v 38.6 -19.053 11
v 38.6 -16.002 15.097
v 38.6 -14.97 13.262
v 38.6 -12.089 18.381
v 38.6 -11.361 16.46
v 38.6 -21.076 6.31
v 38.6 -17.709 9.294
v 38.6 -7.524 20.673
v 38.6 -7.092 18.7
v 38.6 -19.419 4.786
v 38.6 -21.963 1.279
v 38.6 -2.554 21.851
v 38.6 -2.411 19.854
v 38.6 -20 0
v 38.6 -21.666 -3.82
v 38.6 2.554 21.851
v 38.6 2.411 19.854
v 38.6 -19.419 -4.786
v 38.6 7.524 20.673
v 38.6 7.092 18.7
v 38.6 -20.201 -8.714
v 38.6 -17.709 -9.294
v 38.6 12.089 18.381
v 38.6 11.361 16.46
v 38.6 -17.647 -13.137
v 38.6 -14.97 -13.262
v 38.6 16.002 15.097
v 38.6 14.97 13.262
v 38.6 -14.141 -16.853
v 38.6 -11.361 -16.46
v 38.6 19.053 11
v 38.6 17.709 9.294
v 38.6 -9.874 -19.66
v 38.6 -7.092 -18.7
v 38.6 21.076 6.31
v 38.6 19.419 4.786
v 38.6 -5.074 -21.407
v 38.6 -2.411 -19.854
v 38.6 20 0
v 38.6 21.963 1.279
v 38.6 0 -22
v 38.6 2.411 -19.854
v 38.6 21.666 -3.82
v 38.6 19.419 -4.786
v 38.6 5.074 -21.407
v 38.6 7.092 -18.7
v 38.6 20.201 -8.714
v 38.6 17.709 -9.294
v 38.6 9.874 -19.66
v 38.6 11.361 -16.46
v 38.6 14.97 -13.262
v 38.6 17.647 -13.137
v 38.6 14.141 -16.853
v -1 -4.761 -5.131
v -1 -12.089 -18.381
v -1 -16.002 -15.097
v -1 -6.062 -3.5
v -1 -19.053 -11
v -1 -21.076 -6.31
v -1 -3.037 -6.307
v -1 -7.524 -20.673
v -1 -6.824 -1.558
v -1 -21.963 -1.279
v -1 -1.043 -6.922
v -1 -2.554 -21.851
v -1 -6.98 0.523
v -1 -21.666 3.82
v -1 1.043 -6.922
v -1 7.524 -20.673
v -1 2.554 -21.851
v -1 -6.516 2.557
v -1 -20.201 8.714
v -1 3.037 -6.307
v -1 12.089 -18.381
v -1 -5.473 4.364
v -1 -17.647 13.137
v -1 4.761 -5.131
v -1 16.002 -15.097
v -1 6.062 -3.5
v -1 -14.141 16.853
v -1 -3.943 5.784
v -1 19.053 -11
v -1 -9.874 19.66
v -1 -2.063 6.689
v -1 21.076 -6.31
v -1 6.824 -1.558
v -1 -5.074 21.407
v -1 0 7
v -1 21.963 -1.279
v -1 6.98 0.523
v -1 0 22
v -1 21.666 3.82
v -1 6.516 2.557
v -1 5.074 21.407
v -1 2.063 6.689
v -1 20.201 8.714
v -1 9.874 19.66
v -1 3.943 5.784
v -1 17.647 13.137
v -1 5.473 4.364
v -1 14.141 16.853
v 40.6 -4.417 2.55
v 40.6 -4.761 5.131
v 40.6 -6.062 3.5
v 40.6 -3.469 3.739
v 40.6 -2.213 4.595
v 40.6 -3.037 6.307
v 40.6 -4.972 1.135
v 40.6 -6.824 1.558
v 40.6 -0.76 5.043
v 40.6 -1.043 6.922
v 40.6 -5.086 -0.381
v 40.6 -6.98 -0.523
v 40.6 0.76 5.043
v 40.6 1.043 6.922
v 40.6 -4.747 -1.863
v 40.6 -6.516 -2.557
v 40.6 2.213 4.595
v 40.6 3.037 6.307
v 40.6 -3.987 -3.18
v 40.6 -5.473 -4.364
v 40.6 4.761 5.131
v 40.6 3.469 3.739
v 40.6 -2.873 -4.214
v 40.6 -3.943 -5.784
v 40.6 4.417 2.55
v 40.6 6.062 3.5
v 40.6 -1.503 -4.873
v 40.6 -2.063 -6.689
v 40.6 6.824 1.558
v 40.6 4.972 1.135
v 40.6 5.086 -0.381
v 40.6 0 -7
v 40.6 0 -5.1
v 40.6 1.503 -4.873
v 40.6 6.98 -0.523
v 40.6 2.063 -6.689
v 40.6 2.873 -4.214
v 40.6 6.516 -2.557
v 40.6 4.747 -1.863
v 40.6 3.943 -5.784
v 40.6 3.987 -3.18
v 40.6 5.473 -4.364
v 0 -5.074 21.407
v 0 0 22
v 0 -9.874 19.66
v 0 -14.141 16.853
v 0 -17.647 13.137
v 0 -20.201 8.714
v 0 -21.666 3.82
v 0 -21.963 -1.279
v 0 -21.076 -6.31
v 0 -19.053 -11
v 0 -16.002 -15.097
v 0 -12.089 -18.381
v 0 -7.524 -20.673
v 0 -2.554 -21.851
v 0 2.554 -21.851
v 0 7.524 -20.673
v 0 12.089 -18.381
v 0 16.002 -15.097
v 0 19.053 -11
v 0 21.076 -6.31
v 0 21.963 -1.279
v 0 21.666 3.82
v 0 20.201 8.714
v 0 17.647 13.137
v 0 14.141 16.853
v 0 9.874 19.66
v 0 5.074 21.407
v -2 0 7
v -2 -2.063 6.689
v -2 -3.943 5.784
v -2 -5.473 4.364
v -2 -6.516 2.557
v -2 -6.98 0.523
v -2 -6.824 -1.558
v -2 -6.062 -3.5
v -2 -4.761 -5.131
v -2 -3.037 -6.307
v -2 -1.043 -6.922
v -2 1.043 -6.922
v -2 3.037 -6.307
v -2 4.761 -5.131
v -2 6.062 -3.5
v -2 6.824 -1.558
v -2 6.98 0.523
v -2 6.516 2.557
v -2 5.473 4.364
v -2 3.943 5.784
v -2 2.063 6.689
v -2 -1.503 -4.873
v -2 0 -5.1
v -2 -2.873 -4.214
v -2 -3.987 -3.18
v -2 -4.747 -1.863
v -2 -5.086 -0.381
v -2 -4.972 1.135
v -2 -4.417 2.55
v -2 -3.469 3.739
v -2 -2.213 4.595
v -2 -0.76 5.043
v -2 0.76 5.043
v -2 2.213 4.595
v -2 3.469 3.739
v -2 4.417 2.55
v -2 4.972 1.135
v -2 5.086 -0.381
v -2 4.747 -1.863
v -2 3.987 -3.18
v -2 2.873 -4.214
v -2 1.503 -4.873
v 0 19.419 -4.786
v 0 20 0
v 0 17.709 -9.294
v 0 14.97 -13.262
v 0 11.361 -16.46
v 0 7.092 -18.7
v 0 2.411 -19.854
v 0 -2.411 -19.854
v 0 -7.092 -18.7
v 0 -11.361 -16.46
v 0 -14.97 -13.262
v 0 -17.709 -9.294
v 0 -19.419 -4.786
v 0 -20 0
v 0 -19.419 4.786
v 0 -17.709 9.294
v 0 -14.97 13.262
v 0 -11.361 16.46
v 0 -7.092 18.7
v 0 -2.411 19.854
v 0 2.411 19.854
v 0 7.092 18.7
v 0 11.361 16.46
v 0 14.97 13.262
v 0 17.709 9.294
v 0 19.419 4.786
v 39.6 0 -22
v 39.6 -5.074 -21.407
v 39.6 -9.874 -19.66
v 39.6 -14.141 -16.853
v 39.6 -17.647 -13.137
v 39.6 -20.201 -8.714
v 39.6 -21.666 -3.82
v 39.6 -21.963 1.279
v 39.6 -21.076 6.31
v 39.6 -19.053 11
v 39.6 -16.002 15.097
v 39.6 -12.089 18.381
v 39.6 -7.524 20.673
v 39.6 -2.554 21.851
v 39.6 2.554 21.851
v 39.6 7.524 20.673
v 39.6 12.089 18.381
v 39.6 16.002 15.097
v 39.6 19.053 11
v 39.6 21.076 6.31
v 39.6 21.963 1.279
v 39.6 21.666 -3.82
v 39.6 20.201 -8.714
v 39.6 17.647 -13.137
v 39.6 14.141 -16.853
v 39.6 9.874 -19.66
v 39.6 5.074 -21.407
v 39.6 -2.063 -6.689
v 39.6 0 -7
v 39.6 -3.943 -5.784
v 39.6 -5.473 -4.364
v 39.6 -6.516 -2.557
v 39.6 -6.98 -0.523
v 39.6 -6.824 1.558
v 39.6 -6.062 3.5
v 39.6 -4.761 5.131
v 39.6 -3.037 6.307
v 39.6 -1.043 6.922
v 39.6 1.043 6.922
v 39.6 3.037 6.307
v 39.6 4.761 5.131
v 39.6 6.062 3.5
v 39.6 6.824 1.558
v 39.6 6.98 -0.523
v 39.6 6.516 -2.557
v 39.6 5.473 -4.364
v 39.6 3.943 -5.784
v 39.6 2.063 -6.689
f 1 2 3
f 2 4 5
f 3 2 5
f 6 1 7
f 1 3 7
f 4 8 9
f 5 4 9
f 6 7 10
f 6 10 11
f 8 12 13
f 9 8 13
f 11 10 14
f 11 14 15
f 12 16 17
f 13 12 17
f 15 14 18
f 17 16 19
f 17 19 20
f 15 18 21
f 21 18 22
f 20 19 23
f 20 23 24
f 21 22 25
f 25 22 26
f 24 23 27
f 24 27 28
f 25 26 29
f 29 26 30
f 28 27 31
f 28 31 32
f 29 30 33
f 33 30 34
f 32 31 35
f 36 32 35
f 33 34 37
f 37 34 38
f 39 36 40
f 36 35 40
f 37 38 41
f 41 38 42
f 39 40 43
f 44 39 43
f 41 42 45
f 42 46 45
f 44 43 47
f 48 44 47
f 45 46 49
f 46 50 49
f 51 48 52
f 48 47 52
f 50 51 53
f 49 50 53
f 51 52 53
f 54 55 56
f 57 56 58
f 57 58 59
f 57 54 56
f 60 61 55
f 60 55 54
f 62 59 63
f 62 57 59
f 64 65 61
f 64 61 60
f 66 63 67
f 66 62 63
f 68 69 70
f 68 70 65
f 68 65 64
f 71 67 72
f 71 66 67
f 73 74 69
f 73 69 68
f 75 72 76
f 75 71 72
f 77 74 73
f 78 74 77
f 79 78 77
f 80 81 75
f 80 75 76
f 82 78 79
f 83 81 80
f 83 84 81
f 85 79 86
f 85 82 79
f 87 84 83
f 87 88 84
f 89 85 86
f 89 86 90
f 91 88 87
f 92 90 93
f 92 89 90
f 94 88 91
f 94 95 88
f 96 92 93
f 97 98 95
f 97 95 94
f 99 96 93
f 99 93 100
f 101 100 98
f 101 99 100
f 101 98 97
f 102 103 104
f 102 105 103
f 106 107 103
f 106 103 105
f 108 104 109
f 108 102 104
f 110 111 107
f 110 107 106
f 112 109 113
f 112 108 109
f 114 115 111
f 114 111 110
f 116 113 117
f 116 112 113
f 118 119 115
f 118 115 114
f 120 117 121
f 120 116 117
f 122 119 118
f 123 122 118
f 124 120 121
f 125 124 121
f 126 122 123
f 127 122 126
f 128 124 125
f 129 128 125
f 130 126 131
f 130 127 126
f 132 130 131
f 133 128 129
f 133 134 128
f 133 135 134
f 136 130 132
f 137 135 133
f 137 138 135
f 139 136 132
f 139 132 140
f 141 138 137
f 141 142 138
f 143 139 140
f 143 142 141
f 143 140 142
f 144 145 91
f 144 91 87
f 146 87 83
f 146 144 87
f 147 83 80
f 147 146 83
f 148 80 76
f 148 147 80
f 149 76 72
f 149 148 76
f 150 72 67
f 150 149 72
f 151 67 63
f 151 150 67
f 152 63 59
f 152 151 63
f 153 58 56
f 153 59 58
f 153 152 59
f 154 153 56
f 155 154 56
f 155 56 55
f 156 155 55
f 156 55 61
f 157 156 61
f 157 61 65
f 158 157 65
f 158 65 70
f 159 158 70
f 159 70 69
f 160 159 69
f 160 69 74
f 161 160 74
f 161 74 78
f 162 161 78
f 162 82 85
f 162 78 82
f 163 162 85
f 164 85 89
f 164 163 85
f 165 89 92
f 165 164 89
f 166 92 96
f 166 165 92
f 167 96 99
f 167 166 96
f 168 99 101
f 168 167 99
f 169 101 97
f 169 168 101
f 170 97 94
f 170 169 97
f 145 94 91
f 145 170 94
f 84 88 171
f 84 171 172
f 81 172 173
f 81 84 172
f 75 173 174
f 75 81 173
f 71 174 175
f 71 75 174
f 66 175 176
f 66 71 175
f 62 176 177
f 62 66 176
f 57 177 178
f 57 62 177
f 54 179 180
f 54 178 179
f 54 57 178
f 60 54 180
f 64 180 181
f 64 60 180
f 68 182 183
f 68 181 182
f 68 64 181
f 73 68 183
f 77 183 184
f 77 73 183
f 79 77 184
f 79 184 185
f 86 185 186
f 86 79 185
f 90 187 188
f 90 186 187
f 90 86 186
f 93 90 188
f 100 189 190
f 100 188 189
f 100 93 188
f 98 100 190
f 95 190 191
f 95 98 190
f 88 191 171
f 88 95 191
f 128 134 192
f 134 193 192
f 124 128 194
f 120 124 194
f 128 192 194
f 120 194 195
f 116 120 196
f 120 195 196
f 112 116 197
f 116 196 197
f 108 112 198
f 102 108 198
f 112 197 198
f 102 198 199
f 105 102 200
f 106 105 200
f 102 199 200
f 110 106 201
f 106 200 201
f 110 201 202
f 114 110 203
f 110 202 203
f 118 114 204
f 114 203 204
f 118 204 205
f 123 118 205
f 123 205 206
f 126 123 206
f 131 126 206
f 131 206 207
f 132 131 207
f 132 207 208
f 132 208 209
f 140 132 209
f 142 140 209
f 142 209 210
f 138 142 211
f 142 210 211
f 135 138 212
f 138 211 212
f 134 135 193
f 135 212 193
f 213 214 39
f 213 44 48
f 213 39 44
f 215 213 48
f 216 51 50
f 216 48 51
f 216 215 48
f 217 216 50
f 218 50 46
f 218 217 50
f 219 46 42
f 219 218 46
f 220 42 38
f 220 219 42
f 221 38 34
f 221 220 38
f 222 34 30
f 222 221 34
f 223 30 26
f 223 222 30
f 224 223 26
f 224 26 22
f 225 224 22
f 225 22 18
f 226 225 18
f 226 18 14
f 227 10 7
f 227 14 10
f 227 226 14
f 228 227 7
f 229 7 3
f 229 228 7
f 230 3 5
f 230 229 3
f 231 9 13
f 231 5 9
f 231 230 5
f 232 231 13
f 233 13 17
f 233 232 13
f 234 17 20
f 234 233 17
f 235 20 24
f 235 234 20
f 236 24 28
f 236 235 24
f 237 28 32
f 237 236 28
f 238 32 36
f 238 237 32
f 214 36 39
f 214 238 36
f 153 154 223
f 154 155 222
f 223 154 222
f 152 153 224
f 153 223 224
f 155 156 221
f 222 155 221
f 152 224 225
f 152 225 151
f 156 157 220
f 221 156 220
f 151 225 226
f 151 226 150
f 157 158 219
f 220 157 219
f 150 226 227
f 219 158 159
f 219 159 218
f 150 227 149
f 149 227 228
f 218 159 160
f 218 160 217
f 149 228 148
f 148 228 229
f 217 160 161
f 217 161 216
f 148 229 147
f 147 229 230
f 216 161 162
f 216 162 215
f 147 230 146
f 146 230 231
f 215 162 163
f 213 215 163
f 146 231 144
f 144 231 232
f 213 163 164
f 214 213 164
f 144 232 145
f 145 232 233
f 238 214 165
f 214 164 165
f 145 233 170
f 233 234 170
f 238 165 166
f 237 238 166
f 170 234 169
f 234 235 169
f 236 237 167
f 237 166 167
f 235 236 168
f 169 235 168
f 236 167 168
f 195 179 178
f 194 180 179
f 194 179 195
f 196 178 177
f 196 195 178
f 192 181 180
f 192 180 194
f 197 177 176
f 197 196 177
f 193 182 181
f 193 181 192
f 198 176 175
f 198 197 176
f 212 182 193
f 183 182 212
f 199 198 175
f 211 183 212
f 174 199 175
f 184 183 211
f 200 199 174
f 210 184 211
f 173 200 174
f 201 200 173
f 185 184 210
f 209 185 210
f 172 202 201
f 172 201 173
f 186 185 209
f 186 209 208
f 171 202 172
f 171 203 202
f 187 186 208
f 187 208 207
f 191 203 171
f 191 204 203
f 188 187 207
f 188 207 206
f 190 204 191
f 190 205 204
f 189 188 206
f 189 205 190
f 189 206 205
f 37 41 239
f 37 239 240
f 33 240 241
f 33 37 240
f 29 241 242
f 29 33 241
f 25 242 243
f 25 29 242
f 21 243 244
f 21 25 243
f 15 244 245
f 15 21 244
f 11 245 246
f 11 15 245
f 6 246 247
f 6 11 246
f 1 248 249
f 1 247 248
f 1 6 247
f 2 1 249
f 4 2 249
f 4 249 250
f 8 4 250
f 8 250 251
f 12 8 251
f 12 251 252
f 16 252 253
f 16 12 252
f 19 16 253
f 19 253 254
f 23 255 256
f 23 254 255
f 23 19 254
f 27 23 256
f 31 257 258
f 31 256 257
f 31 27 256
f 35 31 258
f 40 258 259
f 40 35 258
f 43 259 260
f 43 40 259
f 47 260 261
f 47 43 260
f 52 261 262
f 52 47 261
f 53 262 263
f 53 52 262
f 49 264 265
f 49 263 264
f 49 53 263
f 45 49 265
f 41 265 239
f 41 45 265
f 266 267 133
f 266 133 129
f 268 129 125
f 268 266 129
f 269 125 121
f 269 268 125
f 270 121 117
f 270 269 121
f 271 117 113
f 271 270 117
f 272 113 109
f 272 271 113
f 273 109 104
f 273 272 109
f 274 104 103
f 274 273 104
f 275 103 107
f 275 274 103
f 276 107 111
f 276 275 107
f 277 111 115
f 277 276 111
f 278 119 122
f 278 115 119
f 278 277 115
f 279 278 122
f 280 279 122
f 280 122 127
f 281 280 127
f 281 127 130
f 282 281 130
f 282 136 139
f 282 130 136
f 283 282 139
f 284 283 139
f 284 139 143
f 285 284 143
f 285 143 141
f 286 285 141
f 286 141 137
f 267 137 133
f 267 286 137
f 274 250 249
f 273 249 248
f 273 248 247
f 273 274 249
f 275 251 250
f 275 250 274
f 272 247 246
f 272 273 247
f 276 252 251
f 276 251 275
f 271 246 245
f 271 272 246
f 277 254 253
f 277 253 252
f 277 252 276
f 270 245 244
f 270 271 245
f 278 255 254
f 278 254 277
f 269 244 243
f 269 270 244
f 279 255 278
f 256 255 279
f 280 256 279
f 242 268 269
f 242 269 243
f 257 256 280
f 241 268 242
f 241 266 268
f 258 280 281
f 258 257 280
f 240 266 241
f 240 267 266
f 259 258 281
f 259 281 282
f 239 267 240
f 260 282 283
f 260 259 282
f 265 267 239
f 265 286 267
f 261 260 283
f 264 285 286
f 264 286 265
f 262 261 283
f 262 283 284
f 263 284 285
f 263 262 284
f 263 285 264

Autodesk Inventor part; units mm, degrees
ref_plane "YZ Plane" through (0, 0, 0) normal (1, 0, 0) x (0, 1, 0)
ref_plane "XZ Plane" through (0, 0, 0) normal (0, 1, 0) x (-1, 0, 0)
ref_plane "XY Plane" through (0, 0, 0) normal (0, 0, 1) x (1, 0, 0)
sketch "スケッチ1" plane through (0, 0, 0) normal (1, 0, 0) x (0, 1, 0)
  circle A0 centre (0, 0) radius 20
  dimension "d0" = 40
extrude "押し出し1" add sketch "スケッチ1" along normal blind 38.6
sketch "スケッチ2" plane through (38.6, 0, 0) normal (1, 0, 0) x (0, 0, -1)
  circle A0 centre (0, 0) radius 22
  dimension "d3" = 44
extrude "押し出し2" add sketch "スケッチ2" along normal blind 1
sketch "スケッチ3" plane through (39.6, 0, 0) normal (1, 0, 0) x (0, 0, -1)
  circle A0 centre (0, 0) radius 7
  dimension "d6" = 14
extrude "押し出し3" add sketch "スケッチ3" along normal blind 1
sketch "スケッチ4" plane through (0, 0, 0) normal (-1, 0, 0) x (0, 0, 1)
  circle A0 centre (0, 0) radius 22
  dimension "d9" = 44
extrude "押し出し4" add sketch "スケッチ4" along normal blind 1
sketch "スケッチ5" plane through (-1, 0, 0) normal (-1, 0, 0) x (0, 0, 1)
  circle A0 centre (0, 0) radius 7
  dimension "d12" = 14
extrude "押し出し5" add sketch "スケッチ5" along normal blind 1
sketch "スケッチ6" plane through (40.6, 0, 0) normal (1, 0, 0) x (0, 0, -1)
  circle A0 centre (0, 0) radius 7 projected
hole "穴1" at (40.6, 0, 0) direction (-1, 0, 0) diameter 10.2 end through all
properties part number "CLS_typeC_31.4N"
